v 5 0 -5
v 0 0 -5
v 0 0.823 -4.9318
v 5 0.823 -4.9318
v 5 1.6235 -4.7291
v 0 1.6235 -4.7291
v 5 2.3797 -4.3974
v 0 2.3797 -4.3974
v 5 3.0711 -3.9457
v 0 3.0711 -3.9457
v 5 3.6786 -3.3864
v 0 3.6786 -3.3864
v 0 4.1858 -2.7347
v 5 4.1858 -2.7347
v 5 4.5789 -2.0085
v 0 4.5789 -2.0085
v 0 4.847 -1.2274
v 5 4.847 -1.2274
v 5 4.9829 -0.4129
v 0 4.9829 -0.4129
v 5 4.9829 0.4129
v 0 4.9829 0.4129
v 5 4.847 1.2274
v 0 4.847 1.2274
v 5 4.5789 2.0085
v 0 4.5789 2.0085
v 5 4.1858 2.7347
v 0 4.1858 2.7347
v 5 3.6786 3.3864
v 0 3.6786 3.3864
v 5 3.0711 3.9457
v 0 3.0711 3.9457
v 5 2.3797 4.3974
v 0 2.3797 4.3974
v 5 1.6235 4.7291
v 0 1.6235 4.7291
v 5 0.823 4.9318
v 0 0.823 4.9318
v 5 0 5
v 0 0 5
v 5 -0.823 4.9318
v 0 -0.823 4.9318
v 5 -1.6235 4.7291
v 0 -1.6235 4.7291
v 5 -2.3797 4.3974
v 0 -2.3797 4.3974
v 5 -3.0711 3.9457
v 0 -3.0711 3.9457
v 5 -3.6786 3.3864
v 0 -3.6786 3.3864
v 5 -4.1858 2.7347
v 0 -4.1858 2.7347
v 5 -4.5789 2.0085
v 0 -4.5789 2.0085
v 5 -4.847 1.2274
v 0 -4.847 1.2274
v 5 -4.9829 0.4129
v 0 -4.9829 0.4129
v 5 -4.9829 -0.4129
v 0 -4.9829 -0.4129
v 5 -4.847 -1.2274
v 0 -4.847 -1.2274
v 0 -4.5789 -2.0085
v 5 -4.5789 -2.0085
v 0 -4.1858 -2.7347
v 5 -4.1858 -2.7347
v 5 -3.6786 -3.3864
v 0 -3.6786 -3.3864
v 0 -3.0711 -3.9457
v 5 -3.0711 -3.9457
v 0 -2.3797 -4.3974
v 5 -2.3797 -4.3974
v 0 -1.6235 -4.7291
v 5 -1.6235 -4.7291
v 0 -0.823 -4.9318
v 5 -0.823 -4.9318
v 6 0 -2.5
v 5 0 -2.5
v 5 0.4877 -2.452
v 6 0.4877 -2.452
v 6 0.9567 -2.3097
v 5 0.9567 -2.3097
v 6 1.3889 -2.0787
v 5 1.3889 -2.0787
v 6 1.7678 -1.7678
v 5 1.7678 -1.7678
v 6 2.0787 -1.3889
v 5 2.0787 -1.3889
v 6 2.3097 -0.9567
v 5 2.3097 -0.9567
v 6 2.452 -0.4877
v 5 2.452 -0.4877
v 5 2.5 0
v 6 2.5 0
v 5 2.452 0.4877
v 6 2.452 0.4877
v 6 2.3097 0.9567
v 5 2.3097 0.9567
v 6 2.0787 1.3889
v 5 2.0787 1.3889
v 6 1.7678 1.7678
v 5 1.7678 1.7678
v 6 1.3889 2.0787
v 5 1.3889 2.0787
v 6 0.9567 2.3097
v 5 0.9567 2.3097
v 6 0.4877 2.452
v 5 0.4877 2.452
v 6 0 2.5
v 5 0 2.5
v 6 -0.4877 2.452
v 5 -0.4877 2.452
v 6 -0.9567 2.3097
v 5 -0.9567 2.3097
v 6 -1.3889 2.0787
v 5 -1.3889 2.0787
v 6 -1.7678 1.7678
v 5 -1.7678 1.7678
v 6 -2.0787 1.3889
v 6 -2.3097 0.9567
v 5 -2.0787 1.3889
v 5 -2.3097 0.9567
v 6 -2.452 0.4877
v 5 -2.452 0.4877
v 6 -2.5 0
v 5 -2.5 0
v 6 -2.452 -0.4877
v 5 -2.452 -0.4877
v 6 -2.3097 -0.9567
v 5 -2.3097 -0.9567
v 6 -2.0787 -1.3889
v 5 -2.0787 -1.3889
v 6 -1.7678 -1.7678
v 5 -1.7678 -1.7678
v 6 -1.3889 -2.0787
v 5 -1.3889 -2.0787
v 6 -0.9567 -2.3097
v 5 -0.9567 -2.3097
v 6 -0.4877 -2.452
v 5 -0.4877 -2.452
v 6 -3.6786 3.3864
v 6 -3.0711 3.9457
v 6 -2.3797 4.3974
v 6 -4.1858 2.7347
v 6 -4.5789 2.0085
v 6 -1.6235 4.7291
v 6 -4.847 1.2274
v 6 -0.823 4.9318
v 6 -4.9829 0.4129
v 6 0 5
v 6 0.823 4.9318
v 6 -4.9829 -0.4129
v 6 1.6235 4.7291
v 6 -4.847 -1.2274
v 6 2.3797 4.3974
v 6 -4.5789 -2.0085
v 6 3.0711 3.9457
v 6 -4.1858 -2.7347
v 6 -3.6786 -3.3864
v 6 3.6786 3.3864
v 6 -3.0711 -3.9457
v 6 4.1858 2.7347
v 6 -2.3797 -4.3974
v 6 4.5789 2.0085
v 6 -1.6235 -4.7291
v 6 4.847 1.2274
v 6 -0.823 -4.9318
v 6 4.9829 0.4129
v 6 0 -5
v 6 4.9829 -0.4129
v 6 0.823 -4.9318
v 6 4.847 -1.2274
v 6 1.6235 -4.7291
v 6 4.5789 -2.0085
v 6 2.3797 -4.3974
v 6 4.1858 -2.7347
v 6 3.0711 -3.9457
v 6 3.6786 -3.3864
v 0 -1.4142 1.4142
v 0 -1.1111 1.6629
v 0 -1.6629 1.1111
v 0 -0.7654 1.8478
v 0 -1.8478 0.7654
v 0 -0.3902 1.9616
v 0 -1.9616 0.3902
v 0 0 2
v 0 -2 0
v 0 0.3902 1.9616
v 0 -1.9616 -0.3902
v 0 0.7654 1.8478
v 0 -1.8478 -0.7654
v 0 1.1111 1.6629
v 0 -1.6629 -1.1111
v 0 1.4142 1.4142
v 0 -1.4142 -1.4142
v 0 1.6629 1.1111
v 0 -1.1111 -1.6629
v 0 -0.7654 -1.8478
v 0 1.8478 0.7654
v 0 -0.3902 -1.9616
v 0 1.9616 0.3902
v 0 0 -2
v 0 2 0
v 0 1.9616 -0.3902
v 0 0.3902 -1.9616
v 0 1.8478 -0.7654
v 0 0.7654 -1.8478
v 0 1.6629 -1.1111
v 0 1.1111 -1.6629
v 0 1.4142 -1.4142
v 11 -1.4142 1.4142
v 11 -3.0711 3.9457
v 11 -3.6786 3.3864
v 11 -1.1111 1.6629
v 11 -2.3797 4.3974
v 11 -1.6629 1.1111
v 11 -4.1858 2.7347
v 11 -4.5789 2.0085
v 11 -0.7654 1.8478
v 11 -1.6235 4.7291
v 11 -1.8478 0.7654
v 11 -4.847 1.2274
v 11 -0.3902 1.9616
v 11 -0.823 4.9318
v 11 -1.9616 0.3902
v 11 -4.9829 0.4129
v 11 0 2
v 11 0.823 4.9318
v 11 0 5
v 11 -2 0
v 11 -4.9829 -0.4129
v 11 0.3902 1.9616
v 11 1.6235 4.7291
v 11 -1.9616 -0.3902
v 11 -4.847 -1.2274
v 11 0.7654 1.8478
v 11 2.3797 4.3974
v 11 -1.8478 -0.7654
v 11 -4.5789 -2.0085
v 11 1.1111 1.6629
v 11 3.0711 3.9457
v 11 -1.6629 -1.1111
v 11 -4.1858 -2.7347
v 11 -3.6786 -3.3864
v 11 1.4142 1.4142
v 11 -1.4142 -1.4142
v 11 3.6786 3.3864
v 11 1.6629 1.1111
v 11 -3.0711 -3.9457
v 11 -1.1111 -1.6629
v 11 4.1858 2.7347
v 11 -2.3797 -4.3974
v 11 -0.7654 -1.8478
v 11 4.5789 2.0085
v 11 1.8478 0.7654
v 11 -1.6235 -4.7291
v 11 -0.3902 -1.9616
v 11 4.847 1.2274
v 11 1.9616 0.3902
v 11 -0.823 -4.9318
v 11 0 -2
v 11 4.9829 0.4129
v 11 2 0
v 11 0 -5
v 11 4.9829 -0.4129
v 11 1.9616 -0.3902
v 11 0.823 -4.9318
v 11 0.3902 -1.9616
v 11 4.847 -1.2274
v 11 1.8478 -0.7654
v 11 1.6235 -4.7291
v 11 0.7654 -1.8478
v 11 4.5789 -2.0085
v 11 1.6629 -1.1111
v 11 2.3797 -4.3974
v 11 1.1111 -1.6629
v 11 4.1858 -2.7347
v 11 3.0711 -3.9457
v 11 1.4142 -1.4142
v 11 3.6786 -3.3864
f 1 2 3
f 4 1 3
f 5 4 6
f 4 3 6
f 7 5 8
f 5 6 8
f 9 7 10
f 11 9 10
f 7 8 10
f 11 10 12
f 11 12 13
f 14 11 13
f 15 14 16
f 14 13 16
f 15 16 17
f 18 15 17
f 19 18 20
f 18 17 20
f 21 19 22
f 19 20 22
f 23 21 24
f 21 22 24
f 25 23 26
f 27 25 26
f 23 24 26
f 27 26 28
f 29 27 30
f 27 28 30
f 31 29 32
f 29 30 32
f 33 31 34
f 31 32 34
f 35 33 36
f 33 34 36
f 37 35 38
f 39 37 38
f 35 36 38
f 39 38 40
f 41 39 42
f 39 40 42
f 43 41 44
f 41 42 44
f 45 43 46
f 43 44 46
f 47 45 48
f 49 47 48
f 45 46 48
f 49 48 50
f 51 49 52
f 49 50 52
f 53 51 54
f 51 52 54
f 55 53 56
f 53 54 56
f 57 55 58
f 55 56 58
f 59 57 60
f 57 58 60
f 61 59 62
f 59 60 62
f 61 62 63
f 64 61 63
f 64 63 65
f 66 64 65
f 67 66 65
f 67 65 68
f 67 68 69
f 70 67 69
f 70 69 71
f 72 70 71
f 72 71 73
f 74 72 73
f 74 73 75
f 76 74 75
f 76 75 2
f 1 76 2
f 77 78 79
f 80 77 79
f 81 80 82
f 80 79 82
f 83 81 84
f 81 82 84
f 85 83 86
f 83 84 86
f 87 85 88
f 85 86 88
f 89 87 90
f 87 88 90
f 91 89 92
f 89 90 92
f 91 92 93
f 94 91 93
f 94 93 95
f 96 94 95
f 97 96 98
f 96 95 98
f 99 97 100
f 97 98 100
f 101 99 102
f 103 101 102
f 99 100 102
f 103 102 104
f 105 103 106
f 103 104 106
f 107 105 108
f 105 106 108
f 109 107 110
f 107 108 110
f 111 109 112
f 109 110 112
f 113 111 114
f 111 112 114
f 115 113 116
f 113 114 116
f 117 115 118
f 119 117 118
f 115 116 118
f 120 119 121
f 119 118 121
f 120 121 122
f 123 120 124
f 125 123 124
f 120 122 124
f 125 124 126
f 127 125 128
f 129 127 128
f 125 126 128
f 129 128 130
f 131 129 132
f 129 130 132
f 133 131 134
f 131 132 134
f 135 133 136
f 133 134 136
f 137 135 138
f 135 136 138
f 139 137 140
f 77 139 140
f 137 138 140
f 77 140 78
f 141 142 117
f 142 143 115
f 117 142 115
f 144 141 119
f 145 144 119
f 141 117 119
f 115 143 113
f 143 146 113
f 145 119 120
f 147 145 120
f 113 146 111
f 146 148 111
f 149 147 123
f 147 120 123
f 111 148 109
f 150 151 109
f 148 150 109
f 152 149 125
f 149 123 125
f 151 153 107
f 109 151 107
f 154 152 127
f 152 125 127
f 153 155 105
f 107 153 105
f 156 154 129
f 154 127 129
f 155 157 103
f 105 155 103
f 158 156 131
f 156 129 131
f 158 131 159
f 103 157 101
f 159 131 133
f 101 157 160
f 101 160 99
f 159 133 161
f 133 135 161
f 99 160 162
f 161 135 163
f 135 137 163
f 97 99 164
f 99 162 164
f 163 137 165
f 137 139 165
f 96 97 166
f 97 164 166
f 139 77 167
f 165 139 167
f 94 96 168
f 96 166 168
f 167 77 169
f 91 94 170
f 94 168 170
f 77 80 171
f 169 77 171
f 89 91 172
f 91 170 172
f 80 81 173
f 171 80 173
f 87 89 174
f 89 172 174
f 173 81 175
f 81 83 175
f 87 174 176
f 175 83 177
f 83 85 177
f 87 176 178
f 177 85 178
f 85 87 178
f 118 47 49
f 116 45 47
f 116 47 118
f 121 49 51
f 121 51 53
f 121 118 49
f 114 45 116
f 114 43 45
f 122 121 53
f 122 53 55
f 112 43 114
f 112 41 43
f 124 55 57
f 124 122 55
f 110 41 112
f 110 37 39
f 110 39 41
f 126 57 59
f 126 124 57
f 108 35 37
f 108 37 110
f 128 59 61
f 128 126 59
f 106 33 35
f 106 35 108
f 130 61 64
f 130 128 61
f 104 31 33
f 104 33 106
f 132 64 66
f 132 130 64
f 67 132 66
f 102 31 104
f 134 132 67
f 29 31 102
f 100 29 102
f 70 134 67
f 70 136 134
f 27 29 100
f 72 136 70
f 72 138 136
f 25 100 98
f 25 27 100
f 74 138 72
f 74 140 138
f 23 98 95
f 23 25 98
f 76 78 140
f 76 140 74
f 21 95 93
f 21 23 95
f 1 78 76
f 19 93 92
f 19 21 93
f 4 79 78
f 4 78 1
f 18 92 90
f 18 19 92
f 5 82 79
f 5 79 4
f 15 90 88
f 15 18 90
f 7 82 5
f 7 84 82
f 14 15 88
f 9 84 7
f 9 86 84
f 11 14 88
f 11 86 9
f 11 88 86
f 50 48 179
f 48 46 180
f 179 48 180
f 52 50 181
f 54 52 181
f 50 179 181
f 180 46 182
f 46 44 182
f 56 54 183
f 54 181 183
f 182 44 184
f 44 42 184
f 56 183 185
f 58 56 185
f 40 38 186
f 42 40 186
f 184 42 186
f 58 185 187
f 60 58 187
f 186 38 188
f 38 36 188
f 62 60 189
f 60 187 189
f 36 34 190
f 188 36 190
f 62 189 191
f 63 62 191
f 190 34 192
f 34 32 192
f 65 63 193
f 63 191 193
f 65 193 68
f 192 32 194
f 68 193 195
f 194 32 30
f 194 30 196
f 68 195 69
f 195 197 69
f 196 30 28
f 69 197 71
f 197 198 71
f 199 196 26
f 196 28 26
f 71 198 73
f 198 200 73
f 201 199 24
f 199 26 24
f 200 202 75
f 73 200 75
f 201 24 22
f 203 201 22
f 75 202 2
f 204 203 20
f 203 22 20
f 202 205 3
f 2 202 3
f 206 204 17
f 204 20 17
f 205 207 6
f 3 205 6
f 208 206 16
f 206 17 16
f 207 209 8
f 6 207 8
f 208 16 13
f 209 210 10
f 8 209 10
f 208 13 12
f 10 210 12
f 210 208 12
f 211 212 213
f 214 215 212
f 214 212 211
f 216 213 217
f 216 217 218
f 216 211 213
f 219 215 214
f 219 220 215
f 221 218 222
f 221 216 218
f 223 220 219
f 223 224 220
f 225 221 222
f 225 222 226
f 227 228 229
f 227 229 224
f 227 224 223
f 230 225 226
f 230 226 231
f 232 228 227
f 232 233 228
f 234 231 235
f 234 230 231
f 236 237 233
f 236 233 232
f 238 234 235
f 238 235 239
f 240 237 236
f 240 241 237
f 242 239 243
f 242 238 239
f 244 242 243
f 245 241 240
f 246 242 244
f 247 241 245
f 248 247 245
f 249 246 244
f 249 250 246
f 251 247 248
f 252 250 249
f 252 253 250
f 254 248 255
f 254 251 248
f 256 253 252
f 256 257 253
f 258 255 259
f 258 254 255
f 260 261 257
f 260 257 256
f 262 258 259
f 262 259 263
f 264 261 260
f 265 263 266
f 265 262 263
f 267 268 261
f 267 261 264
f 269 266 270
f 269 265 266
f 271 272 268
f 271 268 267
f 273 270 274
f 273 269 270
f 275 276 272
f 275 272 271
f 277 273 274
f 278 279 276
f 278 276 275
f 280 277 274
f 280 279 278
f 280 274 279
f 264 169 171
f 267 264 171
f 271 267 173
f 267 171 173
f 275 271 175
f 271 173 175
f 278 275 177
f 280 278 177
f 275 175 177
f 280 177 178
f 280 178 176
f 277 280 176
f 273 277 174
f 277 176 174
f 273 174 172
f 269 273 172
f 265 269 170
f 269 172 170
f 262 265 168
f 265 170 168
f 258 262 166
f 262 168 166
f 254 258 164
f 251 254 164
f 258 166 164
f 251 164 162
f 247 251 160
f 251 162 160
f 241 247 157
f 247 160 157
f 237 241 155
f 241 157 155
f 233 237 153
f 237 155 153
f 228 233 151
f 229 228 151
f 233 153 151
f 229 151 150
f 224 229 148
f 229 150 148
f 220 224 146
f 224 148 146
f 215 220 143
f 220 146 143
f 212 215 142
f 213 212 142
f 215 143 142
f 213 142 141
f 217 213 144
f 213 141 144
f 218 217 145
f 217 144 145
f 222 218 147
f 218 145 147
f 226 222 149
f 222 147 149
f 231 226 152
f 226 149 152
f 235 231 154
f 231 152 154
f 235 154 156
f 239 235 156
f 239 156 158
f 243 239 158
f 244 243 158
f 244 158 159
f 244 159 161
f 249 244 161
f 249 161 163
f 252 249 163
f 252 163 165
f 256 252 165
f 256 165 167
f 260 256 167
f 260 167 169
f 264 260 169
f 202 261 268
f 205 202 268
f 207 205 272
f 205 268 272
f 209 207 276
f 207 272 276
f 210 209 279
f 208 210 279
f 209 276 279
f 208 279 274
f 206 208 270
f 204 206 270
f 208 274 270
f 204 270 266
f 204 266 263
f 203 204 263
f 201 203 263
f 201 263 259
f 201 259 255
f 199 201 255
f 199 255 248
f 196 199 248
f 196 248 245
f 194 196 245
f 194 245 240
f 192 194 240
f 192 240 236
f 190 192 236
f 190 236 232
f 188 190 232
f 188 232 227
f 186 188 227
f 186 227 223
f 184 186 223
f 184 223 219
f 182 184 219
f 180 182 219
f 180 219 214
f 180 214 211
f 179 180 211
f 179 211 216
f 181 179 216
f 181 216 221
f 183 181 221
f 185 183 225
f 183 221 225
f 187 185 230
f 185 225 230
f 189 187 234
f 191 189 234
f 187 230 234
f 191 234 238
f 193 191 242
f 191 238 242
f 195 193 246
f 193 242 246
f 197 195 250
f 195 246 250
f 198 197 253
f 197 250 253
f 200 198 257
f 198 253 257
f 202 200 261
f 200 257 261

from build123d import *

# Parameters (mm, degrees)
SKETCH_1_R          = 5
EXTRUDE_1_DEPTH     = 5
SKETCH_2_R          = 2.5
EXTRUDE_2_DEPTH     = 1
SKETCH_3_R          = 5
EXTRUDE_3_DEPTH     = 5
SKETCH_4_R          = 2
CUT_EXTRUDE_1_DEPTH = 16


with BuildPart() as part:
    # Эскиз1 → Бобышка-Вытянуть1 (new body)
    with BuildSketch(Plane(origin=(0, 0, 0), x_dir=(0, 0, -1), z_dir=(1, 0, 0))):
        Circle(SKETCH_1_R)
    extrude(amount=EXTRUDE_1_DEPTH)

    # Эскиз2 → Бобышка-Вытянуть2 (add)
    with BuildSketch(Plane(origin=(5, 0, 0), x_dir=(0, 0, -1), z_dir=(1, 0, 0))):
        Circle(SKETCH_2_R)
    extrude(amount=EXTRUDE_2_DEPTH)

    # Эскиз3 → Бобышка-Вытянуть3 (add)
    with BuildSketch(Plane(origin=(6, 0, 0), x_dir=(0, 0, -1), z_dir=(1, 0, 0))):
        Circle(SKETCH_3_R)
    extrude(amount=EXTRUDE_3_DEPTH)

    # Эскиз4 → Вырез-Вытянуть1 (cut)
    with BuildSketch(Plane(origin=(11, 0, 0), x_dir=(0, 0, -1), z_dir=(1, 0, 0))):
        Circle(SKETCH_4_R)
    extrude(amount=-CUT_EXTRUDE_1_DEPTH, mode=Mode.SUBTRACT)


solid = part.part
